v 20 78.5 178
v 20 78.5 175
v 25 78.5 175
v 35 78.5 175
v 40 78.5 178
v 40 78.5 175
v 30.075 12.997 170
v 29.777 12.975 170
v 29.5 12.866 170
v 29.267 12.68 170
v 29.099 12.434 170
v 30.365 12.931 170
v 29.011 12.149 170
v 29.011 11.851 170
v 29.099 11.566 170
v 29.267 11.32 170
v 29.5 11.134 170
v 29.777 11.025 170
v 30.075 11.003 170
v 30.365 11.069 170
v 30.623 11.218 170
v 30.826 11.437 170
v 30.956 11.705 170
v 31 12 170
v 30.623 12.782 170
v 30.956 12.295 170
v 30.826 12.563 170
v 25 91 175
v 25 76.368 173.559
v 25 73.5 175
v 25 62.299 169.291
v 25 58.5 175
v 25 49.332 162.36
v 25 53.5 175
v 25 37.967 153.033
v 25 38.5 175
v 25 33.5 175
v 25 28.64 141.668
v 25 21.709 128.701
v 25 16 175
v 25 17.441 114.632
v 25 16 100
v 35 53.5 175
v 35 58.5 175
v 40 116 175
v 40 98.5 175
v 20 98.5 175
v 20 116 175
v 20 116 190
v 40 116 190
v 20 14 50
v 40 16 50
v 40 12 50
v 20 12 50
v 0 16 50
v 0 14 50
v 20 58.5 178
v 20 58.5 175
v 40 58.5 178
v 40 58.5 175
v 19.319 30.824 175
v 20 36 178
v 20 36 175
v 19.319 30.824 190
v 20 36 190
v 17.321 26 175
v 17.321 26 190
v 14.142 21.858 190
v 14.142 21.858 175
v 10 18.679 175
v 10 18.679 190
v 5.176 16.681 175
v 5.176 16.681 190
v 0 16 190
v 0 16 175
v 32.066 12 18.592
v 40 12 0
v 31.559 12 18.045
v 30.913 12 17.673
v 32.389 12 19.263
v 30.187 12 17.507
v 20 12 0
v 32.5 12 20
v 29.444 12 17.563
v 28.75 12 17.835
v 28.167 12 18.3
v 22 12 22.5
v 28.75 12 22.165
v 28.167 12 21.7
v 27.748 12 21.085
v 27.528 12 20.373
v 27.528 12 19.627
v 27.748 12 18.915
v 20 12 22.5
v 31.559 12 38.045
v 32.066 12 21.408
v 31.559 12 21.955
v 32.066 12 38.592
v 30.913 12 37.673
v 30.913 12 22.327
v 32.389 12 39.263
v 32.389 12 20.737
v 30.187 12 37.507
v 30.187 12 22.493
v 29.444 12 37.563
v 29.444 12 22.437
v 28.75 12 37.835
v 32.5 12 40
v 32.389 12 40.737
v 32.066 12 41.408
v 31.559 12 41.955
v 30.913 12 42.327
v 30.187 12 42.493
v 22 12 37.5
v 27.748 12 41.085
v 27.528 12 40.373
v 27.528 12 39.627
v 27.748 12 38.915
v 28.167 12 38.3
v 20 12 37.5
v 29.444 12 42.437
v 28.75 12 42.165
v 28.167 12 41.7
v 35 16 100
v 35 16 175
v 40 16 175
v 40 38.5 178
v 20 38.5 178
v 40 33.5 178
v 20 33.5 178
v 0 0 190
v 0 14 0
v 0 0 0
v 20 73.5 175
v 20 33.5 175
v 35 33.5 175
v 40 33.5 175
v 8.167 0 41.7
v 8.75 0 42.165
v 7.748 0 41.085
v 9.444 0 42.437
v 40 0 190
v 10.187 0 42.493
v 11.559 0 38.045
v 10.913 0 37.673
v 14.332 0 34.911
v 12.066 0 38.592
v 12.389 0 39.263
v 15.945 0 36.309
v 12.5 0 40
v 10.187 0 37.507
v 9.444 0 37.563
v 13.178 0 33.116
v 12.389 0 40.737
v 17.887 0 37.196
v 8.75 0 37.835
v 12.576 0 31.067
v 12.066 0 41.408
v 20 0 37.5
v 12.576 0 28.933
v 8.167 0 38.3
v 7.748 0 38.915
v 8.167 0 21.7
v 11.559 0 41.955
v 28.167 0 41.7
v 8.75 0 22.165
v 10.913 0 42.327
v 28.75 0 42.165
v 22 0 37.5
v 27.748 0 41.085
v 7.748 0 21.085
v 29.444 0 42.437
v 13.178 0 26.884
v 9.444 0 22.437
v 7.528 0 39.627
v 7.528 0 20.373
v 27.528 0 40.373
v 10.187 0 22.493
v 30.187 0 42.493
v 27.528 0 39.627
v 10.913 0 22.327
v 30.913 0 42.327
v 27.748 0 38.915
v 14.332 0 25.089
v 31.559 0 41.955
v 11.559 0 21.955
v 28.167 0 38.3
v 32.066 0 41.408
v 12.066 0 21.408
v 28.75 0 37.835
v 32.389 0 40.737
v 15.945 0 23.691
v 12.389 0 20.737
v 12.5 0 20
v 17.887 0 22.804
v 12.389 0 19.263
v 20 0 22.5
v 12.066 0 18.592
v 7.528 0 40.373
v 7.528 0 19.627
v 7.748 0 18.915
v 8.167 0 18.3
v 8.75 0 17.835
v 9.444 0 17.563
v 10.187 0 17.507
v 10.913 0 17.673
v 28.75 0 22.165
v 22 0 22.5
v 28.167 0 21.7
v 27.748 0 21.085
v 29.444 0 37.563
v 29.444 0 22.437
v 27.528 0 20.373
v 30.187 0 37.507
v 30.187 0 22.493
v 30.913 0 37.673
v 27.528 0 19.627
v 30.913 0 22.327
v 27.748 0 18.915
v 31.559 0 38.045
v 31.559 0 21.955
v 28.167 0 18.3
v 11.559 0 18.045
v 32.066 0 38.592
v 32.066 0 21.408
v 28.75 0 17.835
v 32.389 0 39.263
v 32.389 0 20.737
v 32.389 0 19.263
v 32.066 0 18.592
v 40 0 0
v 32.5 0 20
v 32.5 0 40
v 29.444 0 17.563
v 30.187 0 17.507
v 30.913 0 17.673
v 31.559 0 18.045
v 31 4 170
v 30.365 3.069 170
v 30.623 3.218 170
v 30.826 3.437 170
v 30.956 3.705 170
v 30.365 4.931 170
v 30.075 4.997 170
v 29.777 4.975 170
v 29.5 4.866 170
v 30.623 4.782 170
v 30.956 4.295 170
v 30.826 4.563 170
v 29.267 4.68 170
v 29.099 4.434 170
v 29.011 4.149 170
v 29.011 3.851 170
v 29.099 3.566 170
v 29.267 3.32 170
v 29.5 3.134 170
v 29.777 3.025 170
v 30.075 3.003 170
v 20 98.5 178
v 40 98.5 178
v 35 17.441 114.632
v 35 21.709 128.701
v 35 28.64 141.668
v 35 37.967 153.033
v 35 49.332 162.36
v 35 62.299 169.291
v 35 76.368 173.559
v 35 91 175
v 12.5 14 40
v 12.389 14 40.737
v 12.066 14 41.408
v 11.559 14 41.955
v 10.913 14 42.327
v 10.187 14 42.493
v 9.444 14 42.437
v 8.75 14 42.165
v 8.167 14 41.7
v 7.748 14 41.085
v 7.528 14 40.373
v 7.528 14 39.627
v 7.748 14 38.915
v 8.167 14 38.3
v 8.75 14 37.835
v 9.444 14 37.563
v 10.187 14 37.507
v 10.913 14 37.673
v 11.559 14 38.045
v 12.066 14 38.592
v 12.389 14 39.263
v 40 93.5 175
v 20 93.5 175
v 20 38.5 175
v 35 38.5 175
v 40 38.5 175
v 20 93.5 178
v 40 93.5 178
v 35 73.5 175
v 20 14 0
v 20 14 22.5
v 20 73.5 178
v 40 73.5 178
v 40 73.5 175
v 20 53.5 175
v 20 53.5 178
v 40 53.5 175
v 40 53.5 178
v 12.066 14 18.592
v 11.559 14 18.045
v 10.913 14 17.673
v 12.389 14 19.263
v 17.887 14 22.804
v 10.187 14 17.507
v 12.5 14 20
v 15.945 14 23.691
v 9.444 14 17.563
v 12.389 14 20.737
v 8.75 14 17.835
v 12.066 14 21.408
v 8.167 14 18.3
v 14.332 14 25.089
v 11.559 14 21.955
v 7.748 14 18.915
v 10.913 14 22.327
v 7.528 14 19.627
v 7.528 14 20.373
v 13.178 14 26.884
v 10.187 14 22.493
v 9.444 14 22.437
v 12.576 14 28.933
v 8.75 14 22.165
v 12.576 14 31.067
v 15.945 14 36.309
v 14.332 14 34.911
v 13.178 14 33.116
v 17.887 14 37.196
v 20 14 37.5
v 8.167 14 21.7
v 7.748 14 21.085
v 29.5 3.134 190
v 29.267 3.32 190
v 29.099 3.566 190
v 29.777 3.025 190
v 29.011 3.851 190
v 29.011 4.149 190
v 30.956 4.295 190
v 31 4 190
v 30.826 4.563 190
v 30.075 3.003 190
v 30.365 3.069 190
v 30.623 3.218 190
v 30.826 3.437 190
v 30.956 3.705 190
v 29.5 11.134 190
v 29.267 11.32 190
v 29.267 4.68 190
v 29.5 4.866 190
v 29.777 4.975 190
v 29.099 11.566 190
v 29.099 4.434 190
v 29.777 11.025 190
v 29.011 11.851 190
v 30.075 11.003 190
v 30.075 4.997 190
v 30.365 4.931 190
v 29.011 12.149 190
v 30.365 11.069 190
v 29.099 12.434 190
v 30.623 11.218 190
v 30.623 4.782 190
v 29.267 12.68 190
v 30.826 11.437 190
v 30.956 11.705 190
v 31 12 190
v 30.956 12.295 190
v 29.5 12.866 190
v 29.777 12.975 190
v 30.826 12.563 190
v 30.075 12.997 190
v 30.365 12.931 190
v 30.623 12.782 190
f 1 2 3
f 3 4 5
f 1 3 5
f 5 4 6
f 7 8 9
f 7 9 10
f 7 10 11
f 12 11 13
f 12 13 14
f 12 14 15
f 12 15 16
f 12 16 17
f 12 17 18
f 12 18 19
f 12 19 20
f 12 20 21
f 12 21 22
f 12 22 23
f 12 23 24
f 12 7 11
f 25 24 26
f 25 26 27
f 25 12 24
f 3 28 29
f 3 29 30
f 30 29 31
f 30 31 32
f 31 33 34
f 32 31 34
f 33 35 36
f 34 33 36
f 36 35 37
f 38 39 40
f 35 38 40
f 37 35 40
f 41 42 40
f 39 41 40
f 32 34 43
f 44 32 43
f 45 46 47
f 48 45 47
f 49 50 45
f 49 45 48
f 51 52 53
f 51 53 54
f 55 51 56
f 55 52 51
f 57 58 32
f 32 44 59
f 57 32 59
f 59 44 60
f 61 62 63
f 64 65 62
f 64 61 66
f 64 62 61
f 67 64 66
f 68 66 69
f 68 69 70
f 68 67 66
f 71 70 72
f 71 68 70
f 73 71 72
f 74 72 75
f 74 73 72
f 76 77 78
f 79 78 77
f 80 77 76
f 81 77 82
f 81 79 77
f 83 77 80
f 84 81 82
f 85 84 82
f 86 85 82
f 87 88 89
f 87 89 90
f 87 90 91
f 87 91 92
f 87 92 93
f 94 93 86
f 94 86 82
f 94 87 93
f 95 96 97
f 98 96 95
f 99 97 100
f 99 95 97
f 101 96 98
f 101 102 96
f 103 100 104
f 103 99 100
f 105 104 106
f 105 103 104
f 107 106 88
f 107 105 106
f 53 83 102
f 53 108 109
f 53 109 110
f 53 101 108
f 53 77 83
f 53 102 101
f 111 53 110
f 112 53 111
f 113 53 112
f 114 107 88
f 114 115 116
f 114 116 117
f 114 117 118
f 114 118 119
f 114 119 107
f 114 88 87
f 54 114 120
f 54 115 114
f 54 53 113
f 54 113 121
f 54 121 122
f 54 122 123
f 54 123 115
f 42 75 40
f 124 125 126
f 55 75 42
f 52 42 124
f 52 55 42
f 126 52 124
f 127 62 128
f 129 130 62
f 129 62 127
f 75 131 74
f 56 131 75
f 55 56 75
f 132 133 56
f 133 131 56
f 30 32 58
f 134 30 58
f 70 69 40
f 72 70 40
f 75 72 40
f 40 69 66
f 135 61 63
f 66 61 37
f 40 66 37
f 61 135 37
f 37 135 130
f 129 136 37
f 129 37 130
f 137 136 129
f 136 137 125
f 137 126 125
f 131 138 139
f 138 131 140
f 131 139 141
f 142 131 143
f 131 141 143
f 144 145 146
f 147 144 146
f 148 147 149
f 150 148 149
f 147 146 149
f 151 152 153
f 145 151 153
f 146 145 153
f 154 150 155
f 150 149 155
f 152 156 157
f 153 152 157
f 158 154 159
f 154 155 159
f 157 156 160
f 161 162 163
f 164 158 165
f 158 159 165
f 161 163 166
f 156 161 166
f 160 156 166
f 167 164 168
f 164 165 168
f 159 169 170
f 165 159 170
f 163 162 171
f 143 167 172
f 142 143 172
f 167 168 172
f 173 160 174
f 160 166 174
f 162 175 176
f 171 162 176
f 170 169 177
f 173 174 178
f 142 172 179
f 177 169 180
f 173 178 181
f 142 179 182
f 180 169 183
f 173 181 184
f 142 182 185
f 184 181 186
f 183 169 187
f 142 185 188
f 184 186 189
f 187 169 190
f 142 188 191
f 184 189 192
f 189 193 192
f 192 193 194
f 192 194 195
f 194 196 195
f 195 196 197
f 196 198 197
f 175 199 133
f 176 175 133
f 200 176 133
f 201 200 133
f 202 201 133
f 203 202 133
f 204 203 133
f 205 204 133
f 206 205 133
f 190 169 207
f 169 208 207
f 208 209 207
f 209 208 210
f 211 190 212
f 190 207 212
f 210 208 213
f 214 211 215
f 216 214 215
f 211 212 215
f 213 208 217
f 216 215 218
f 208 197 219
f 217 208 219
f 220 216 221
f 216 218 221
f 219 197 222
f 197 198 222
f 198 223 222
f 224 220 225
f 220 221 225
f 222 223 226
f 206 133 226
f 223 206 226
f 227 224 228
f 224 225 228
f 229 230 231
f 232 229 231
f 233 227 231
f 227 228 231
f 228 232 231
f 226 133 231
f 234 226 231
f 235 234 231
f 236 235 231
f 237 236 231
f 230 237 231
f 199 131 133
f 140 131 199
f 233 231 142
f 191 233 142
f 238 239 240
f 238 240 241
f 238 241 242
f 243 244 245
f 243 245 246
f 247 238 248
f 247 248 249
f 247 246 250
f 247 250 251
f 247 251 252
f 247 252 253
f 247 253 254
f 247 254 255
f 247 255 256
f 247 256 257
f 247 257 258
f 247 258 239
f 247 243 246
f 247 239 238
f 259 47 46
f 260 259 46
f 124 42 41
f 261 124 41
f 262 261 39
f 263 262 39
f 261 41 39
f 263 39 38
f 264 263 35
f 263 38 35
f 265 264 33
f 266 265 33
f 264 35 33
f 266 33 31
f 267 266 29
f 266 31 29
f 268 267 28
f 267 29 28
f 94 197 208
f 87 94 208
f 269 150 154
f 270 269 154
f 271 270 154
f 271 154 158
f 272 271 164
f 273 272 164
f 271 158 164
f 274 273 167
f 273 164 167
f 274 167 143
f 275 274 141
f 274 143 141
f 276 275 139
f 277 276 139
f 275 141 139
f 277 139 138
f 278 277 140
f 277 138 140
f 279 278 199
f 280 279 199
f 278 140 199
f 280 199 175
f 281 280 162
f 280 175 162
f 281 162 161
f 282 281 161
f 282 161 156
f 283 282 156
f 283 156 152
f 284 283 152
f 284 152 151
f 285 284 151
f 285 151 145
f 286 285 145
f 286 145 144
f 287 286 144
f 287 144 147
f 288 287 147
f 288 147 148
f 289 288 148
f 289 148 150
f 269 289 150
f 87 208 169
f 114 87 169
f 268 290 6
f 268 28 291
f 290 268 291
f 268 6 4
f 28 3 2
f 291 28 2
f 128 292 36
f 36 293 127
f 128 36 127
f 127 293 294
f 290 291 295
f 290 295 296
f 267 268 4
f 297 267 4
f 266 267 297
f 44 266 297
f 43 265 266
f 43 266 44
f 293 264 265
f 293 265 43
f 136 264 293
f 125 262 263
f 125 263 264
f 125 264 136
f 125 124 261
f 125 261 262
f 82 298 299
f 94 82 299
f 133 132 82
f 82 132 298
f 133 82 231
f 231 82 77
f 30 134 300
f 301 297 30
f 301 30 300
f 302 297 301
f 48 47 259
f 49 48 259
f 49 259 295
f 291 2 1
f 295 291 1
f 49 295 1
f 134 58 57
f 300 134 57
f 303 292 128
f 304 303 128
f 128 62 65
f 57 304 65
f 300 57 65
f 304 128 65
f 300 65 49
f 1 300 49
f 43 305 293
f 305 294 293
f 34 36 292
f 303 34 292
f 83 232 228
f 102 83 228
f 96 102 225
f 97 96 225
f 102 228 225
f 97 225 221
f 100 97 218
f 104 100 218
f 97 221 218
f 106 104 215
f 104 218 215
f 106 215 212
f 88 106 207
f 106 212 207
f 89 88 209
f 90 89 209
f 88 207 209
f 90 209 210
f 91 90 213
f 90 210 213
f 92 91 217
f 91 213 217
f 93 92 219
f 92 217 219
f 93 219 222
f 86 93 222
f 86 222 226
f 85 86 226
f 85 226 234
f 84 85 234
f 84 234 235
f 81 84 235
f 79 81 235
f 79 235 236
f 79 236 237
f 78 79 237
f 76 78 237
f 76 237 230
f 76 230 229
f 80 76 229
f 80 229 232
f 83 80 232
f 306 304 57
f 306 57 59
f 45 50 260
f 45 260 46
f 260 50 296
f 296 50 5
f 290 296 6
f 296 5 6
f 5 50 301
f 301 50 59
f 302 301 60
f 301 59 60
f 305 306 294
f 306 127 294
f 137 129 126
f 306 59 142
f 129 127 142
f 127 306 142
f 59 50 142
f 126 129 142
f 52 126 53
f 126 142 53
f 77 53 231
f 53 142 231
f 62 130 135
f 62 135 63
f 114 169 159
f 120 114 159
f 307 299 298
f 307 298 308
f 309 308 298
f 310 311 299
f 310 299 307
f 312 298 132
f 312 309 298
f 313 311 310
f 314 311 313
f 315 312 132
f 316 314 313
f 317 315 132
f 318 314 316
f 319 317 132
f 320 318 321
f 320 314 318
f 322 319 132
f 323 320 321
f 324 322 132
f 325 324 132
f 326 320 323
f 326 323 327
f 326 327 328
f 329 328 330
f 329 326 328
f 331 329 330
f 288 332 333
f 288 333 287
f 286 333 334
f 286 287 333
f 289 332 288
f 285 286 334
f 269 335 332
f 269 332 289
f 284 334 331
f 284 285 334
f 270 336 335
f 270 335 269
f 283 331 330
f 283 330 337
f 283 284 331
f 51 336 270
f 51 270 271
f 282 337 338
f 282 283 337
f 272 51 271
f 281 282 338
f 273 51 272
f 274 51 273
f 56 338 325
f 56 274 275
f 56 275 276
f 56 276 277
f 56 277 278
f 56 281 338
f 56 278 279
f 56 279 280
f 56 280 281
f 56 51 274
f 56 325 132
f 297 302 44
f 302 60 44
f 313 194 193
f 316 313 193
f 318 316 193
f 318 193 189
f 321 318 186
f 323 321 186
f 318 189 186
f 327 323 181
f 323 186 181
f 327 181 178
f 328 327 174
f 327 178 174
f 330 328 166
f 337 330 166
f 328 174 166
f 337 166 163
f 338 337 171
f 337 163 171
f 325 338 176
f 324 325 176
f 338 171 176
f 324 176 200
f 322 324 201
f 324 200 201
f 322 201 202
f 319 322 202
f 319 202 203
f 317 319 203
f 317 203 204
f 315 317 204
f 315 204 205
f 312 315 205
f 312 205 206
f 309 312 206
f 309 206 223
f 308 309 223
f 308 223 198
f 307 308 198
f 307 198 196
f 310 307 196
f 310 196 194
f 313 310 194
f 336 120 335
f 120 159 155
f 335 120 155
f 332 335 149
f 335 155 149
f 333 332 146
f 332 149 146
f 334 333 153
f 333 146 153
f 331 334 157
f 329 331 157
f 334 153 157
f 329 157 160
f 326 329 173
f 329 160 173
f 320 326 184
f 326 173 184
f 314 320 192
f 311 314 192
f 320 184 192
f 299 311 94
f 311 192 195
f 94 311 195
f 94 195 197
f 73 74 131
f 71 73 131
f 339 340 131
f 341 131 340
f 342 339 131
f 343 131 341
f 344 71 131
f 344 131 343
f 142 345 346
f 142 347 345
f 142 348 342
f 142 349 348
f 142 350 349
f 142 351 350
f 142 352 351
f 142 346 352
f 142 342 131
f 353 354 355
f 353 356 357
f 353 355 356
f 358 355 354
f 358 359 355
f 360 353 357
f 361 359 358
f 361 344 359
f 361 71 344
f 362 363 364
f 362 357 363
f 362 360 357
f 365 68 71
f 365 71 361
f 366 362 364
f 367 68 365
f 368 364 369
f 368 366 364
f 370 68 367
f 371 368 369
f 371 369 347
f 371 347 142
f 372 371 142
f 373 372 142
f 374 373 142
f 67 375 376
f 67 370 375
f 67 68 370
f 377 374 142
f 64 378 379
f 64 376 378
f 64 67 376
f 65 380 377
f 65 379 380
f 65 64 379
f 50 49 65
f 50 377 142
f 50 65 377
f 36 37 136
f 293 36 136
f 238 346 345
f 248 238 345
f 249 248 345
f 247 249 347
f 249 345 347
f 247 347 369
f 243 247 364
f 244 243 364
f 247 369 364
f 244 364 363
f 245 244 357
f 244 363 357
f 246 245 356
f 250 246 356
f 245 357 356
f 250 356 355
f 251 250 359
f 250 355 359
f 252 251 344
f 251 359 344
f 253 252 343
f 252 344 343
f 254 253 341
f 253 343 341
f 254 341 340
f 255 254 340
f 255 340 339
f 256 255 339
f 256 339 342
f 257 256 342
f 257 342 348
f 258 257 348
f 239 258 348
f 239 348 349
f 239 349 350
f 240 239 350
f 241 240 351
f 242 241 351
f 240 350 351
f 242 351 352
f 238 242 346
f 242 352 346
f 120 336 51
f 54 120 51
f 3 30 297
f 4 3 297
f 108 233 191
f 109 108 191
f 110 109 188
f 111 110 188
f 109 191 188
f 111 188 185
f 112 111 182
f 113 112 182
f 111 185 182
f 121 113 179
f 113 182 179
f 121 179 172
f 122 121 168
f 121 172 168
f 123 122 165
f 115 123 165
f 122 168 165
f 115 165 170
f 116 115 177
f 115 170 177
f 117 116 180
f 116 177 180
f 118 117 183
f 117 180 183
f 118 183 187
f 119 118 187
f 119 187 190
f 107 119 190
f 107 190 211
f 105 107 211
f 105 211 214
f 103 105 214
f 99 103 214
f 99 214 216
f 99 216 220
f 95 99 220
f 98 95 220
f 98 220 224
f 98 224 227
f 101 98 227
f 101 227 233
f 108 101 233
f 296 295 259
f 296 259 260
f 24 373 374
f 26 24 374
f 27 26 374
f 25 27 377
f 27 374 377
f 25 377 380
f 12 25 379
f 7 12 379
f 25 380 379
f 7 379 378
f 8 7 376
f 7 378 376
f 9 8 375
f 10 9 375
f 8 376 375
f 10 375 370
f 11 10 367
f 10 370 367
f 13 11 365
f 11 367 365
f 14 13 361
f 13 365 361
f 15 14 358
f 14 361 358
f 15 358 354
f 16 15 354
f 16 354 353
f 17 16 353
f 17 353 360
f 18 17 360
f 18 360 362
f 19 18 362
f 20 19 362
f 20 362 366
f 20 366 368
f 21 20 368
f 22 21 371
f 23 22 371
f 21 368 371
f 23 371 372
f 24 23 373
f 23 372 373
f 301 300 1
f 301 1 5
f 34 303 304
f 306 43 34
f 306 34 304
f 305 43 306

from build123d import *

# Parameters (mm, degrees)
F0_W      = 40
F0_H      = 16
F1_DEPTH  = 190
F2_R      = 2.5
F3_DEPTH  = 20
F4_W      = 40
F4_H      = 50
F5_DEPTH  = 2
F6_W      = 20
F6_H      = 50
F7_DEPTH  = 2
F8_R      = 1
F9_DEPTH  = 20
F10_W     = 10
F10_H     = 75
F11_DEPTH = 100
F13_DEPTH = 10
F14_W     = 20
F14_H     = 5
F15_DEPTH = 3
F17_DEPTH = 15


with BuildPart() as f1:
    # F0 (on Top) → F1 (new body)
    with BuildSketch(Plane.XY):
        with Locations((20, 8)):
            Rectangle(F0_W, F0_H)
    extrude(amount=F1_DEPTH)

    # F2 (on face) → F3 (cut)
    with BuildSketch(Plane.XZ):
        with Locations((10, 40)):
            Circle(F2_R)
        with Locations((30, 40)):
            Circle(F2_R)
        with Locations((10, 20)):
            Circle(F2_R)
        with Locations((30, 20)):
            Circle(F2_R)
        with BuildLine():
            ThreePointArc((20, 37.5), (12.5, 30), (20, 22.5))
            Line((20, 22.5), (22, 22.5))
            Line((22, 22.5), (22, 37.5))
            Line((22, 37.5), (20, 37.5))
        make_face()
    extrude(amount=-F3_DEPTH, mode=Mode.SUBTRACT)

    # F4 (on face) → F5 (cut)
    with BuildSketch(Plane(origin=(0, 16, 0), x_dir=(-1, 0, 0), z_dir=(0, 1, 0))):
        with Locations((-20, 25)):
            Rectangle(F4_W, F4_H)
    extrude(amount=-F5_DEPTH, mode=Mode.SUBTRACT)

    # F6 (on face) → F7 (cut)
    with BuildSketch(Plane(origin=(0, 14, 0), x_dir=(-1, 0, 0), z_dir=(0, 1, 0))):
        with Locations((-30, 25)):
            Rectangle(F6_W, F6_H)
    extrude(amount=-F7_DEPTH, mode=Mode.SUBTRACT)

    # F8 (on face) → F9 (cut)
    with BuildSketch(Plane.XY.offset(190)):
        with Locations((30, 12)):
            Circle(F8_R)
        with Locations((30, 4)):
            Circle(F8_R)
    extrude(amount=-F9_DEPTH, mode=Mode.SUBTRACT)

    # F10 (on face) → F11 (join)
    with BuildSketch(Plane(origin=(0, 16, 0), x_dir=(-1, 0, 0), z_dir=(0, 1, 0))):
        Polygon((-20, 190), (-40, 190), (-40, 175), (-35, 175), (-25, 175), (-20, 175), align=None)
        with Locations((-30, 137.5)):
            Rectangle(F10_W, F10_H)
    extrude(amount=F11_DEPTH)

    # F12 (on face) → F13 (cut)
    with BuildSketch(Plane(origin=(25, 0, 0), x_dir=(0, -1, 0), z_dir=(-1, 0, 0))):
        with BuildLine():
            ThreePointArc((-116, 170.7106781187), (-134.3012701892, 38.7627564304), (-16, 100))
            ThreePointArc((-16, 100), (-37.966991411, 153.033008589), (-91, 175))
            Line((-91, 175), (-91, 100))
            Line((-91, 100), (-116, 100))
            Line((-116, 100), (-116, 170.7106781187))
        make_face()
        with BuildLine():
            Line((-91, 100), (-91, 175))
            ThreePointArc((-91, 175), (-103.6826484044, 173.919891974), (-116, 170.7106781187))
            Line((-116, 170.7106781187), (-116, 100))
            Line((-116, 100), (-91, 100))
        make_face()
        with BuildLine():
            ThreePointArc((-116, 170.7106781187), (-103.6826484044, 173.919891974), (-91, 175))
            Line((-91, 175), (-116, 175))
            Line((-116, 175), (-116, 170.7106781187))
        make_face()
    extrude(amount=-F13_DEPTH, mode=Mode.SUBTRACT)

    # F14 (on face) → F15 (cut)
    with BuildSketch(Plane(origin=(0, 0, 175), x_dir=(1, 0, 0), z_dir=(0, 0, -1))):
        with Locations((30, -96)):
            Rectangle(F14_W, F14_H)
        with Locations((30, -76)):
            Rectangle(F14_W, F14_H)
        with Locations((30, -56)):
            Rectangle(F14_W, F14_H)
        with Locations((30, -36)):
            Rectangle(F14_W, F14_H)
    extrude(amount=-F15_DEPTH, mode=Mode.SUBTRACT)

    # F16 (on face) → F17 (join)
    with BuildSketch(Plane.XY.offset(190)):
        with BuildLine():
            ThreePointArc((20, 36), (14.1421356237, 21.8578643763), (0, 16))
            Line((0, 16), (20, 16))
            Line((20, 16), (20, 36))
        make_face()
    extrude(amount=-F17_DEPTH)


solid = f1.part
